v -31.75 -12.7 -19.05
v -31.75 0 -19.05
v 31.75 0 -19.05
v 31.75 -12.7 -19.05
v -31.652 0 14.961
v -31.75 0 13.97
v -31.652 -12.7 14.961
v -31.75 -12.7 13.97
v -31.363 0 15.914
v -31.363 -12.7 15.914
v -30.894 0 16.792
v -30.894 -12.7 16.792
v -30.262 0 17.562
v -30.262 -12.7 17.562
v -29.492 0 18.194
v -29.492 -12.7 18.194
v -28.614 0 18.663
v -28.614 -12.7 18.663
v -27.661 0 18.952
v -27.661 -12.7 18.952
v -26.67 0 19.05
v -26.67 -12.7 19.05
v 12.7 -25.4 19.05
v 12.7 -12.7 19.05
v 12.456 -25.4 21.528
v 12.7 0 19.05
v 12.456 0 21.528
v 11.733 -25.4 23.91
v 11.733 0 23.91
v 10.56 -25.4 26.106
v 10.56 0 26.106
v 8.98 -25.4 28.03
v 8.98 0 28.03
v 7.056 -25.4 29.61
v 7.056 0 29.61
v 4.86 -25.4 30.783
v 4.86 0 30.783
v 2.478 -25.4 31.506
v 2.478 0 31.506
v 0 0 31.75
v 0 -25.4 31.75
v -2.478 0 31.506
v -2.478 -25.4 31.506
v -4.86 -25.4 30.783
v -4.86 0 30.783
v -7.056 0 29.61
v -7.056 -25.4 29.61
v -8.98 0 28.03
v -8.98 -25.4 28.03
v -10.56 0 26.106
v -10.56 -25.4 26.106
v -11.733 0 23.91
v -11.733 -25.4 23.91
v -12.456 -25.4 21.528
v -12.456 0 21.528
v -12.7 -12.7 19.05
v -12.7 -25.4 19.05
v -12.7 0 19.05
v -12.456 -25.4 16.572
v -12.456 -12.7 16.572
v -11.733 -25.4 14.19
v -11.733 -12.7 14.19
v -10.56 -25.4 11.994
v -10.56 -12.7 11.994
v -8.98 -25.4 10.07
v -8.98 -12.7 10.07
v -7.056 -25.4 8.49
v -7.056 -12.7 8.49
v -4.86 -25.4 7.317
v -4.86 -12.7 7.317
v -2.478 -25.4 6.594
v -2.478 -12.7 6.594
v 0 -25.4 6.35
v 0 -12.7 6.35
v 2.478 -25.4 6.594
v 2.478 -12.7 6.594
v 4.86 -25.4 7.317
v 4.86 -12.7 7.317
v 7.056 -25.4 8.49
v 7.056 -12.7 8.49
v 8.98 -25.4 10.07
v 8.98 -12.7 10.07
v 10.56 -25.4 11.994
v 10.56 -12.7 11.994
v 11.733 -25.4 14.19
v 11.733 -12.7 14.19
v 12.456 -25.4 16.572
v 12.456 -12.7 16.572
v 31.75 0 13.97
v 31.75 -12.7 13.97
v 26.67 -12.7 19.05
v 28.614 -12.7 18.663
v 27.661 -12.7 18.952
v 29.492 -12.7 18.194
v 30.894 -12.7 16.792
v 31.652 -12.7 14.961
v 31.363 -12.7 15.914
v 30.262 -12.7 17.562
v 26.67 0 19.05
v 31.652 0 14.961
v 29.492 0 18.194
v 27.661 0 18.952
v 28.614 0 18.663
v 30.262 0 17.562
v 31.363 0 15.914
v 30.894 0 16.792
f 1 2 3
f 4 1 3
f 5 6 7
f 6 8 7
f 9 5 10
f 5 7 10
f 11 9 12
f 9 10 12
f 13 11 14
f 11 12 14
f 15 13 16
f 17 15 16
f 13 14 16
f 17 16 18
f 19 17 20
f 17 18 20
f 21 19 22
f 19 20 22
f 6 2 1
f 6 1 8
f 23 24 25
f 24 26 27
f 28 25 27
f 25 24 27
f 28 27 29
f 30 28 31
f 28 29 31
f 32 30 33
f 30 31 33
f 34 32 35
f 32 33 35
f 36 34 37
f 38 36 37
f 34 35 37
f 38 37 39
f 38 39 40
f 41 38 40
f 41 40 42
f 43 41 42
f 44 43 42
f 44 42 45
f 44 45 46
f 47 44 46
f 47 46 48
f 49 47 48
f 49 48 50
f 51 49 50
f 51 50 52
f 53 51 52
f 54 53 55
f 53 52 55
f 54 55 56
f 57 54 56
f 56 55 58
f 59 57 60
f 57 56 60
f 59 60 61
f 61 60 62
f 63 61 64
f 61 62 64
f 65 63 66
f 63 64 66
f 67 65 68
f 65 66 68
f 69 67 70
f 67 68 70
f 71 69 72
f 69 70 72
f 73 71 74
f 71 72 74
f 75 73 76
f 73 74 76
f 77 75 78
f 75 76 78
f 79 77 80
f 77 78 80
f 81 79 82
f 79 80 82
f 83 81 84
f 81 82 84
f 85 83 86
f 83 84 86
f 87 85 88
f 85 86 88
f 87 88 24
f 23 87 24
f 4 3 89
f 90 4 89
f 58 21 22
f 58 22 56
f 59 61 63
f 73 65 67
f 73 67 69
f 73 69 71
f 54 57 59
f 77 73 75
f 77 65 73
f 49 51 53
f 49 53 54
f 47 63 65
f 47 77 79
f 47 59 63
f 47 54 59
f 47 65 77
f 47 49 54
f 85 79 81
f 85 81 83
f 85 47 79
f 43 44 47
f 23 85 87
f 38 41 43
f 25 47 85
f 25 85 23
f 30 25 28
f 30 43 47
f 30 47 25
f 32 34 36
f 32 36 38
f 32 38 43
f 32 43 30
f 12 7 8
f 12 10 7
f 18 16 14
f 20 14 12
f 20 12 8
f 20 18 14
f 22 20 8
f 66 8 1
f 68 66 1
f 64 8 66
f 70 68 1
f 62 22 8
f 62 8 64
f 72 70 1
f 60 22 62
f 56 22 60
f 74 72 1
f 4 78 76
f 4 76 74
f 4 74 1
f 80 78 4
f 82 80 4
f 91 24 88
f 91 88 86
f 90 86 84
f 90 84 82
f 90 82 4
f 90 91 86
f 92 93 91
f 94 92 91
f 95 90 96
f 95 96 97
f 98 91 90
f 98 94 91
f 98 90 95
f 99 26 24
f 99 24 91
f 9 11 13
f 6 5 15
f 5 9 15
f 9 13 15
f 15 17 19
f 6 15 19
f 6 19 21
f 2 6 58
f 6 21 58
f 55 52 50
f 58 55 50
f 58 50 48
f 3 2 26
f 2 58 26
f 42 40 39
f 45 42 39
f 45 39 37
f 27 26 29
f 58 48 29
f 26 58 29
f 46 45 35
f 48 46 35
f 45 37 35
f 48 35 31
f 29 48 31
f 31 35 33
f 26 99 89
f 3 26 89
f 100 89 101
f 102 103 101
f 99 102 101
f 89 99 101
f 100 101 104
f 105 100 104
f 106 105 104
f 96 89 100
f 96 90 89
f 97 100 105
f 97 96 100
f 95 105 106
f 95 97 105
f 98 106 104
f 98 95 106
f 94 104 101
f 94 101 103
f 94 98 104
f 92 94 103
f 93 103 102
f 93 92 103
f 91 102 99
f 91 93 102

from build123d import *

# Parameters (mm, degrees)
F0_W     = 63.5
F0_H     = 38.1
F1_DEPTH = 12.7
F2_R     = 5.08
F3_R     = 12.7
F4_DEPTH = 25.4


with BuildPart() as f1:
    # F0 (on Front) → F1 (new body)
    with BuildSketch(Plane.XZ):
        Rectangle(F0_W, F0_H)
    extrude(amount=F1_DEPTH)

    # F2
    f2_edges = [f1.edges().sort_by_distance(p)[0] for p in [
        (31.75, -6.35, 19.05),
        (-31.75, -6.35, 19.05),
    ]]
    fillet(f2_edges, radius=F2_R)

    # F3 (on Front) → F4 (join)
    with BuildSketch(Plane.XZ):
        with Locations((0, 19.05)):
            Circle(F3_R)
    extrude(amount=F4_DEPTH)


solid = f1.part
